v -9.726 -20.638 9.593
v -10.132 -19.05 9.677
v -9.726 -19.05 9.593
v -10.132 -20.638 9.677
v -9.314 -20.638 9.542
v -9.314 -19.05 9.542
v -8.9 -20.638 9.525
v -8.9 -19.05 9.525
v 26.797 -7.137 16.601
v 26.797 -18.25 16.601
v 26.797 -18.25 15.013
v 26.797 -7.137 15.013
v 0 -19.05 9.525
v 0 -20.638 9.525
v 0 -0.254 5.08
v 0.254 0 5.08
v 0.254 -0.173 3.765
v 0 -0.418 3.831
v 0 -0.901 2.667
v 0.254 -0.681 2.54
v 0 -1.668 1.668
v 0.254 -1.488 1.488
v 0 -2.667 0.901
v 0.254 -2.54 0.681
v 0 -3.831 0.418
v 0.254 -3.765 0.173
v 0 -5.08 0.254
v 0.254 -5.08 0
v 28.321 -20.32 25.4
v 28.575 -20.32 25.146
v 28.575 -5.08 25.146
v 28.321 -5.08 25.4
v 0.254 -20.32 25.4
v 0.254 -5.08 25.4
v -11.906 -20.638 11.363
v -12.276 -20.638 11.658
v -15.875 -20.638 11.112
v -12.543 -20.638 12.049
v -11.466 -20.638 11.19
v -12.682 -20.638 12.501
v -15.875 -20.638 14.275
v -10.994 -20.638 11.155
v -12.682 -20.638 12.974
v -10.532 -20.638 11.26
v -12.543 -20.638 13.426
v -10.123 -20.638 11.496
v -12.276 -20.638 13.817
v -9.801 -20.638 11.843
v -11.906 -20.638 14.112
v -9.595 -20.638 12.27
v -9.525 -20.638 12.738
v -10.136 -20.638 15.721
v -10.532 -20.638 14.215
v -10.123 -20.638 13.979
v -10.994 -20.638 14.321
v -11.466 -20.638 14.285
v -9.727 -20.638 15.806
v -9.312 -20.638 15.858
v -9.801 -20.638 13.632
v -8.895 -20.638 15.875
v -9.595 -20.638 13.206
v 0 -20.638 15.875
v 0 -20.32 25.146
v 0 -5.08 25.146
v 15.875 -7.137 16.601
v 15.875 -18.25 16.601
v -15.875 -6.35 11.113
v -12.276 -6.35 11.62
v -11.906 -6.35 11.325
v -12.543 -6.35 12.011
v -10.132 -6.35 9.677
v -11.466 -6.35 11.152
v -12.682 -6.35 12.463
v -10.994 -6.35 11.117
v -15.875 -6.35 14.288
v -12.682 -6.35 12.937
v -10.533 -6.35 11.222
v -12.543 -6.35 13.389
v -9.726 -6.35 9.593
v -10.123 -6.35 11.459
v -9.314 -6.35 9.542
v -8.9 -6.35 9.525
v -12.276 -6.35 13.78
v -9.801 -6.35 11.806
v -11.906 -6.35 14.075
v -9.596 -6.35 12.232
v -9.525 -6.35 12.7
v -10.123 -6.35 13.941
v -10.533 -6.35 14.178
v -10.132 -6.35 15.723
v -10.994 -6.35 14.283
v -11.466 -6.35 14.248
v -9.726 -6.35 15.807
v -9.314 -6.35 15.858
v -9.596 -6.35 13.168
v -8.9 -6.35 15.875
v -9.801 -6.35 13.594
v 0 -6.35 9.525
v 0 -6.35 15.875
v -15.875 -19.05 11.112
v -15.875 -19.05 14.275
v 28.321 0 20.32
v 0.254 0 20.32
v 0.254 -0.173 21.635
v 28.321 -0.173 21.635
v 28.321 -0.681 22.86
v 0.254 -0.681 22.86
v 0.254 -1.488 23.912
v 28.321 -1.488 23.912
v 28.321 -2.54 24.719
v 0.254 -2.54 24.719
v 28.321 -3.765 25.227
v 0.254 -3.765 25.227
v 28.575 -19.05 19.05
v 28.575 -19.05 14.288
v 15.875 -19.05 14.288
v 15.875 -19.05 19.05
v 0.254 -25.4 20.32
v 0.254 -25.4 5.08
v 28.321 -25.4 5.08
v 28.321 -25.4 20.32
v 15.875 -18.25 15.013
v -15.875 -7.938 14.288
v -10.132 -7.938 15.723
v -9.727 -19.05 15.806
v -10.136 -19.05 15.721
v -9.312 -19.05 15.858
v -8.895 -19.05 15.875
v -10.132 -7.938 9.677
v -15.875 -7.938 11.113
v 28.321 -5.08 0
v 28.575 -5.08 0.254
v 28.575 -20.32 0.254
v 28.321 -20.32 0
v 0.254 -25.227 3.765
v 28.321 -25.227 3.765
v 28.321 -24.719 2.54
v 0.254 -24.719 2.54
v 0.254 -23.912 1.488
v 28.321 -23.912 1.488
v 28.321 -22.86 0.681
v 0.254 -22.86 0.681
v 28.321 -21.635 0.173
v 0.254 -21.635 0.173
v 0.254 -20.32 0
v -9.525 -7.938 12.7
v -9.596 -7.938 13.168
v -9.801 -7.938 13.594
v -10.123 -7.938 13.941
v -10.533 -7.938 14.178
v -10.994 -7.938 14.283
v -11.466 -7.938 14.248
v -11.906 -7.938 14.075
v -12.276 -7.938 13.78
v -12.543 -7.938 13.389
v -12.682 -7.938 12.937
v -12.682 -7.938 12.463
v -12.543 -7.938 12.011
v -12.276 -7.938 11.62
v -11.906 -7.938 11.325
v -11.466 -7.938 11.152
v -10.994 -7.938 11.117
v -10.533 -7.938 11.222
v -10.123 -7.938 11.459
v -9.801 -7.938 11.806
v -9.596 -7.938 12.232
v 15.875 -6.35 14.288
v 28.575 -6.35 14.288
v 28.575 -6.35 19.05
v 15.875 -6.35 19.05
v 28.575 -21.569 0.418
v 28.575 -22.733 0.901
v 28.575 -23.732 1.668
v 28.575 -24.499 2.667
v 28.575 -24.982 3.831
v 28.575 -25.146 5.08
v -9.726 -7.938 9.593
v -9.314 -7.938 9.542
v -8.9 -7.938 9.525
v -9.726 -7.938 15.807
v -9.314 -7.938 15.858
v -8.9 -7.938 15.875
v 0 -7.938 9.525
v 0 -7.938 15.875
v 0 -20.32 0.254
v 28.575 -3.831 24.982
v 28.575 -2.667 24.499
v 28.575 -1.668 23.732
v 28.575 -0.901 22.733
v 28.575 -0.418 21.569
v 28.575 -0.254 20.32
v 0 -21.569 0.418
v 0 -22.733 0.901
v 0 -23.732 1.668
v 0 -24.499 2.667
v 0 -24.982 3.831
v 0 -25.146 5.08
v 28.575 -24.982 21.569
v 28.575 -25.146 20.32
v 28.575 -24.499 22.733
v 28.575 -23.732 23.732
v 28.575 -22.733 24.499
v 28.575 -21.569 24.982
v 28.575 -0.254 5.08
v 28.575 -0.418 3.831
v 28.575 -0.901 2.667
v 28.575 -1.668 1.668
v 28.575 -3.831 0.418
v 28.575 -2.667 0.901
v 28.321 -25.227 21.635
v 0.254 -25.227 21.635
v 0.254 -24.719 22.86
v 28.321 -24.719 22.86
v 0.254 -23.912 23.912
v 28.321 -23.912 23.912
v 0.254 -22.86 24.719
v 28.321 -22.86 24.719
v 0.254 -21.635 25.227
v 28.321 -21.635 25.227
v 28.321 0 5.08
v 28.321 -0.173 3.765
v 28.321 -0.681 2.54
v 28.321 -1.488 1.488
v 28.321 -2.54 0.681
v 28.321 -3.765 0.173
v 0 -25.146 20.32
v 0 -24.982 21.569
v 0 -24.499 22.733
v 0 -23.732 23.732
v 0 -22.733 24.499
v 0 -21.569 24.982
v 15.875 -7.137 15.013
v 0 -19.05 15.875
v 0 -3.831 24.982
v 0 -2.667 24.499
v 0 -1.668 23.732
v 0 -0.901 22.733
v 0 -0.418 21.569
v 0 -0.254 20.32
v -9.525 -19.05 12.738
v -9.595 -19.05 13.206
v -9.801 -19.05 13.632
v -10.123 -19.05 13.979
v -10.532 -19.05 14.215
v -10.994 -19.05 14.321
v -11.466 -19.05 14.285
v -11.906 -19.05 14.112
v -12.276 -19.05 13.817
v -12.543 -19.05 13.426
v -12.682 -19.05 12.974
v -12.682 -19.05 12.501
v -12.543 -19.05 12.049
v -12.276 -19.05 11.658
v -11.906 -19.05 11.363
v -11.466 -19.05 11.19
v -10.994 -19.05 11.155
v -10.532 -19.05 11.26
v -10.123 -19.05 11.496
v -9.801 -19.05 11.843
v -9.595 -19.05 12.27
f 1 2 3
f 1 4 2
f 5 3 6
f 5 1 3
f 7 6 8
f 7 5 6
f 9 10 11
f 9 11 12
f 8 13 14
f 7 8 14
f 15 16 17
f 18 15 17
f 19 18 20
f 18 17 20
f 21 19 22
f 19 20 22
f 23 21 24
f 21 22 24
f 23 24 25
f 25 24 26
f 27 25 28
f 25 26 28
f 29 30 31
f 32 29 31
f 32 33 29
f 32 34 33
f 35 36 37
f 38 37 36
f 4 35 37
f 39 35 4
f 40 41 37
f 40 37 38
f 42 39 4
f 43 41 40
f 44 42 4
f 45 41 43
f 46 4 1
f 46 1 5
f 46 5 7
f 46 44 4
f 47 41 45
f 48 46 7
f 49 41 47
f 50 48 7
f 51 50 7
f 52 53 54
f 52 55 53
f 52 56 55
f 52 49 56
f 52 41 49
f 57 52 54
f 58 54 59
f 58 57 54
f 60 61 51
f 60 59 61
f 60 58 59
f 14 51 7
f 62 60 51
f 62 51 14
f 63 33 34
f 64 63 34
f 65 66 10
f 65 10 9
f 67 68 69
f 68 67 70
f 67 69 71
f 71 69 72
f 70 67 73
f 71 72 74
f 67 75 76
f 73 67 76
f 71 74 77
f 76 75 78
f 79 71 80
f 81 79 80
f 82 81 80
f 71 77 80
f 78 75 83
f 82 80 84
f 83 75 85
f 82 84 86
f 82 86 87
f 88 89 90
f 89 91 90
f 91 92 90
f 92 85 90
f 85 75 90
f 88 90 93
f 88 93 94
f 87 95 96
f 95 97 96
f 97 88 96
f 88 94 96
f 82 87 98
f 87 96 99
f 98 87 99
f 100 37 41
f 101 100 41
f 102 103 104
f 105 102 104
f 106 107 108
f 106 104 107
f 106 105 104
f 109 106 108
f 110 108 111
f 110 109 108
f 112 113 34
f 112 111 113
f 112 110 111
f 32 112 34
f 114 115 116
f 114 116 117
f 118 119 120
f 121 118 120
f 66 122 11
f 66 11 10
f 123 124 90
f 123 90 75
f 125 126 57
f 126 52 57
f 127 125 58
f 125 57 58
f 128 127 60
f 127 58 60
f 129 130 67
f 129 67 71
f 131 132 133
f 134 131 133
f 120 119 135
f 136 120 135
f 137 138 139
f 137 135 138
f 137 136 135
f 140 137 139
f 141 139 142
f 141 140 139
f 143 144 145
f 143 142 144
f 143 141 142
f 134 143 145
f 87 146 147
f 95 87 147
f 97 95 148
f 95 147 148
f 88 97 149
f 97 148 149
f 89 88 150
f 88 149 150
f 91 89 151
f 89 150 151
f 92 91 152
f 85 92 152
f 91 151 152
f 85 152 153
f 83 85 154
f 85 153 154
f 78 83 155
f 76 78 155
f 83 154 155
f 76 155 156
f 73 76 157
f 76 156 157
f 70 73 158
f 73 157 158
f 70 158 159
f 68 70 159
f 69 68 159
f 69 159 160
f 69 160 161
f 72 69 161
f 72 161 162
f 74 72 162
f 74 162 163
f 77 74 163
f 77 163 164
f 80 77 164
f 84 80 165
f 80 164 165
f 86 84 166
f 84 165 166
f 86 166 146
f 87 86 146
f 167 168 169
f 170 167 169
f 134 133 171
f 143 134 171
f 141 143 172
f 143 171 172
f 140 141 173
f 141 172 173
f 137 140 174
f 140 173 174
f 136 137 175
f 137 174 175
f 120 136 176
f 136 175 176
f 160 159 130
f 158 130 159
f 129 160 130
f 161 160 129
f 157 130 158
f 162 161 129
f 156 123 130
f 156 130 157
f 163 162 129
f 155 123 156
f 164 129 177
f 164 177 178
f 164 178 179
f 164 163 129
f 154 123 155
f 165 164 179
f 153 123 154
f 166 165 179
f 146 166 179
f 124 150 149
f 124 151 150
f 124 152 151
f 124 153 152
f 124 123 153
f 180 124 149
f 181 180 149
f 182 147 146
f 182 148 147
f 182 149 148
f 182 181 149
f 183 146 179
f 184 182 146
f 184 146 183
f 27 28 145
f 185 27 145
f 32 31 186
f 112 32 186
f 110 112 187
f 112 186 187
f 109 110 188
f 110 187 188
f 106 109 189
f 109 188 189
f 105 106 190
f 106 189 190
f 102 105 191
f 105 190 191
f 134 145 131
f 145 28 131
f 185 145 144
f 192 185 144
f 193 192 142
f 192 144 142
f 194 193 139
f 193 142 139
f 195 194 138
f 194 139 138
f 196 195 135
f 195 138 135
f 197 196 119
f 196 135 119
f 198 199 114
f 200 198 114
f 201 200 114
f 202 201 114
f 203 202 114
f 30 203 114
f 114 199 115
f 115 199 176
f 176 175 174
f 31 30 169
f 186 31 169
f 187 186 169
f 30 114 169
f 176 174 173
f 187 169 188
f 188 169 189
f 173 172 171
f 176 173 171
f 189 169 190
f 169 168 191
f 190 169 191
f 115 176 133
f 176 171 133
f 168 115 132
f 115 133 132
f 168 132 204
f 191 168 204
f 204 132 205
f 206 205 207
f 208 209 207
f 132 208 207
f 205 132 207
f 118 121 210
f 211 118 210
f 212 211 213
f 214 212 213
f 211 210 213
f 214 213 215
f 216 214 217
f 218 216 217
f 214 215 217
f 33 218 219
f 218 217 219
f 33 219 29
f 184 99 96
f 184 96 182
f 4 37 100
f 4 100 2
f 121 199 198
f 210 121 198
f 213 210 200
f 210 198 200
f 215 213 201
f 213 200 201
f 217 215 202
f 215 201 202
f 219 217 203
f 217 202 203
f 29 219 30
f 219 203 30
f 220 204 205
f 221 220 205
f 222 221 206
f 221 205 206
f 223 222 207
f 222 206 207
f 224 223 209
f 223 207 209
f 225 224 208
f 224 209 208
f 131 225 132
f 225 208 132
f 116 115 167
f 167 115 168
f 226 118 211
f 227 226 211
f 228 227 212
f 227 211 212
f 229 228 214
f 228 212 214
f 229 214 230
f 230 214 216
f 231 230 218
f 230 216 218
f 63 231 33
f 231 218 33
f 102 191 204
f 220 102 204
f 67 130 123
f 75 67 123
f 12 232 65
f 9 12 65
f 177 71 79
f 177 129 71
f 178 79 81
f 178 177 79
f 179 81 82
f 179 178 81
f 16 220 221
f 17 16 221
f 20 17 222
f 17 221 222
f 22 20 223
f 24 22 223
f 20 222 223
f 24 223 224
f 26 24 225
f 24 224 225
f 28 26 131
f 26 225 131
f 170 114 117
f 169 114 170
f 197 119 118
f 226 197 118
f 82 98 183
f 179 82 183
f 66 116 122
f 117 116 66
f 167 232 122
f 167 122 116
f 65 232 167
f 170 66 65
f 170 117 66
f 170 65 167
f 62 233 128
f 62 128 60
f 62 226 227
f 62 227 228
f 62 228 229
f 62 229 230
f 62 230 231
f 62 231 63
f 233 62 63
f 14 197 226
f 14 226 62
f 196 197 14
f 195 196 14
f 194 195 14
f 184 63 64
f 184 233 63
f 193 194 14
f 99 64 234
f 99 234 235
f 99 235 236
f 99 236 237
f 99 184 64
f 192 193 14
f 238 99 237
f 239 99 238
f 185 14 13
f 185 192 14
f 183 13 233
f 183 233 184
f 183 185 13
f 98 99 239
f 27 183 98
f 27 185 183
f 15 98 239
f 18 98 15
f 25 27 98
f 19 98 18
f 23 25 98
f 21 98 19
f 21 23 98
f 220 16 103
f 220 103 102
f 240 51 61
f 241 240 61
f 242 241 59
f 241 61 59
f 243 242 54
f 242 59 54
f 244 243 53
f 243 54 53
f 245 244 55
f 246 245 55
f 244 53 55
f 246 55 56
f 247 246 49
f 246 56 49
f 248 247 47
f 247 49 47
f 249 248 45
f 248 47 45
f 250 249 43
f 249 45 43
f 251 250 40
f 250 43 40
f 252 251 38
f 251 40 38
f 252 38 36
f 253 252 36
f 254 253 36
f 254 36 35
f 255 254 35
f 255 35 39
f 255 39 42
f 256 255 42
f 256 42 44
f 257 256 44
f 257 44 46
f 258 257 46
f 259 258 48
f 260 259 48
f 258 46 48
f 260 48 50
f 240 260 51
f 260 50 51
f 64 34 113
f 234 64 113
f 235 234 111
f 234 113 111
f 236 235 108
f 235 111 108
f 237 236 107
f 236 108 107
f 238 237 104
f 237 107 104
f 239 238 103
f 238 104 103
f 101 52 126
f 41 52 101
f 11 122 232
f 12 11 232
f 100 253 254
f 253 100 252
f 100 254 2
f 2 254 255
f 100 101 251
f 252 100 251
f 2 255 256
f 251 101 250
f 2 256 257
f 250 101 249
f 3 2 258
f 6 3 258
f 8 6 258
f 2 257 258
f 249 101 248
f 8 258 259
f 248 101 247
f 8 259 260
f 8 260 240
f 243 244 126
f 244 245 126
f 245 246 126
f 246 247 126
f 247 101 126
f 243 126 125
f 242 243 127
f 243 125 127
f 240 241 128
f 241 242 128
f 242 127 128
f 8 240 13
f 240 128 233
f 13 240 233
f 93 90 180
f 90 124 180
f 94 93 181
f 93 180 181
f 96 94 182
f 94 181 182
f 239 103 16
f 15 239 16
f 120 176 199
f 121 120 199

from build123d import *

# Parameters (mm, degrees)
F0_W      = 28.575
F0_H      = 25.4
F1_DEPTH  = 25.4
F2_R      = 5.08
F3_W      = 12.7
F3_H      = 4.7625
F4_DEPTH  = 12.7
F5_W      = 11.1125
F5_H      = 1.5875
F6_DEPTH  = 10.922
F7_W      = 1.5875
F7_H      = 6.35
F8_DEPTH  = 9.525
F9_W      = 6.35
F9_H      = 3.1623
F10_DEPTH = 1.5875
F11_R     = 1.5875
F12_DEPTH = 1.5875
F13_R     = 5.08
F14_W     = 1.5875
F14_H     = 6.35
F15_DEPTH = 9.525
F16_W     = 6.35
F16_H     = 3.175
F17_DEPTH = 1.5875
F18_R     = 1.5875
F19_DEPTH = 1.5875
F20_R     = 5.08
F21_SIZE  = 0.254
F22_SIZE  = 0.254


with BuildPart() as f1:
    # F0 (on Top) → F1 (new body)
    with BuildSketch(Plane.XY):
        with Locations((14.2875, -12.7)):
            Rectangle(F0_W, F0_H)
    extrude(amount=F1_DEPTH)

    # F2
    f2_edges = [f1.edges().sort_by_distance(p)[0] for p in [
        (14.2875, -25.4, 25.4),
        (14.2875, 0, 25.4),
        (14.2875, -25.4, 0),
        (14.2875, 0, 0),
    ]]
    fillet(f2_edges, radius=F2_R)

    # F3 (on face) → F4 (cut)
    with BuildSketch(Plane.YZ.offset(28.575)):
        with Locations((-12.7, 16.66875)):
            Rectangle(F3_W, F3_H)
    extrude(amount=-F4_DEPTH, mode=Mode.SUBTRACT)

    # F5 (on face) → F6 (join)
    with BuildSketch(Plane.YZ.offset(15.875)):
        with Locations((-12.69365, 15.8069642857)):
            Rectangle(F5_W, F5_H)
    extrude(amount=F6_DEPTH)

    # F7 (on face) → F8 (join)
    with BuildSketch(Plane(origin=(0, 0, 0), x_dir=(0, -1, 0), z_dir=(-1, 0, 0))):
        with Locations((19.84375, 12.7)):
            Rectangle(F7_W, F7_H)
    extrude(amount=F8_DEPTH)

    # F9 (on face) → F10 (join)
    with BuildSketch(Plane.XZ.offset(20.6375)):
        Polygon((-15.875, 11.1125), (-9.525, 9.525), (-9.525, 11.1125), align=None)
        with Locations((-12.7, 12.69365)):
            Rectangle(F9_W, F9_H)
        Polygon((-15.875, 14.2748), (-9.525, 14.2748), (-9.525, 15.875), align=None)
    extrude(amount=-F10_DEPTH)

    # F11 (on face) → F12 (cut)
    with BuildSketch(Plane.XZ.offset(20.6375)):
        with Locations((-11.1124364053, 12.7375950676)):
            Circle(F11_R)
    extrude(amount=-F12_DEPTH, mode=Mode.SUBTRACT)

    # F13
    f13_edges = [f1.edges().sort_by_distance(p)[0] for p in [
        (-9.525, -19.84375, 15.875),
        (-9.525, -19.84375, 9.525),
    ]]
    fillet(f13_edges, radius=F13_R)

    # F14 (on face) → F15 (join)
    with BuildSketch(Plane(origin=(0, 0, 0), x_dir=(0, -1, 0), z_dir=(-1, 0, 0))):
        with Locations((7.14375, 12.7)):
            Rectangle(F14_W, F14_H)
    extrude(amount=F15_DEPTH)

    # F16 (on face) → F17 (join)
    with BuildSketch(Plane.XZ.offset(7.9375)):
        with Locations((-12.7, 12.7)):
            Rectangle(F16_W, F16_H)
        Polygon((-9.525, 14.2875), (-9.525, 15.875), (-15.875, 14.2875), align=None)
        Polygon((-9.525, 9.525), (-9.525, 11.1125), (-15.875, 11.1125), align=None)
    extrude(amount=-F17_DEPTH)

    # F18 (on face) → F19 (cut)
    with BuildSketch(Plane.XZ.offset(7.9375)):
        with Locations((-11.1125, 12.7)):
            Circle(F18_R)
    extrude(amount=-F19_DEPTH, mode=Mode.SUBTRACT)

    # F20
    f20_edges = [f1.edges().sort_by_distance(p)[0] for p in [
        (-9.525, -7.14375, 15.875),
        (-9.525, -7.14375, 9.525),
    ]]
    fillet(f20_edges, radius=F20_R)

    # F21
    f21_edges = [f1.edges().sort_by_distance(p)[0] for p in [
        (28.575, -12.7, 25.4),
    ]]
    chamfer(f21_edges, length=F21_SIZE)

    # F22
    f22_edges = [f1.edges().sort_by_distance(p)[0] for p in [
        (0, -12.7, 25.4),
    ]]
    chamfer(f22_edges, length=F22_SIZE)


solid = f1.part
